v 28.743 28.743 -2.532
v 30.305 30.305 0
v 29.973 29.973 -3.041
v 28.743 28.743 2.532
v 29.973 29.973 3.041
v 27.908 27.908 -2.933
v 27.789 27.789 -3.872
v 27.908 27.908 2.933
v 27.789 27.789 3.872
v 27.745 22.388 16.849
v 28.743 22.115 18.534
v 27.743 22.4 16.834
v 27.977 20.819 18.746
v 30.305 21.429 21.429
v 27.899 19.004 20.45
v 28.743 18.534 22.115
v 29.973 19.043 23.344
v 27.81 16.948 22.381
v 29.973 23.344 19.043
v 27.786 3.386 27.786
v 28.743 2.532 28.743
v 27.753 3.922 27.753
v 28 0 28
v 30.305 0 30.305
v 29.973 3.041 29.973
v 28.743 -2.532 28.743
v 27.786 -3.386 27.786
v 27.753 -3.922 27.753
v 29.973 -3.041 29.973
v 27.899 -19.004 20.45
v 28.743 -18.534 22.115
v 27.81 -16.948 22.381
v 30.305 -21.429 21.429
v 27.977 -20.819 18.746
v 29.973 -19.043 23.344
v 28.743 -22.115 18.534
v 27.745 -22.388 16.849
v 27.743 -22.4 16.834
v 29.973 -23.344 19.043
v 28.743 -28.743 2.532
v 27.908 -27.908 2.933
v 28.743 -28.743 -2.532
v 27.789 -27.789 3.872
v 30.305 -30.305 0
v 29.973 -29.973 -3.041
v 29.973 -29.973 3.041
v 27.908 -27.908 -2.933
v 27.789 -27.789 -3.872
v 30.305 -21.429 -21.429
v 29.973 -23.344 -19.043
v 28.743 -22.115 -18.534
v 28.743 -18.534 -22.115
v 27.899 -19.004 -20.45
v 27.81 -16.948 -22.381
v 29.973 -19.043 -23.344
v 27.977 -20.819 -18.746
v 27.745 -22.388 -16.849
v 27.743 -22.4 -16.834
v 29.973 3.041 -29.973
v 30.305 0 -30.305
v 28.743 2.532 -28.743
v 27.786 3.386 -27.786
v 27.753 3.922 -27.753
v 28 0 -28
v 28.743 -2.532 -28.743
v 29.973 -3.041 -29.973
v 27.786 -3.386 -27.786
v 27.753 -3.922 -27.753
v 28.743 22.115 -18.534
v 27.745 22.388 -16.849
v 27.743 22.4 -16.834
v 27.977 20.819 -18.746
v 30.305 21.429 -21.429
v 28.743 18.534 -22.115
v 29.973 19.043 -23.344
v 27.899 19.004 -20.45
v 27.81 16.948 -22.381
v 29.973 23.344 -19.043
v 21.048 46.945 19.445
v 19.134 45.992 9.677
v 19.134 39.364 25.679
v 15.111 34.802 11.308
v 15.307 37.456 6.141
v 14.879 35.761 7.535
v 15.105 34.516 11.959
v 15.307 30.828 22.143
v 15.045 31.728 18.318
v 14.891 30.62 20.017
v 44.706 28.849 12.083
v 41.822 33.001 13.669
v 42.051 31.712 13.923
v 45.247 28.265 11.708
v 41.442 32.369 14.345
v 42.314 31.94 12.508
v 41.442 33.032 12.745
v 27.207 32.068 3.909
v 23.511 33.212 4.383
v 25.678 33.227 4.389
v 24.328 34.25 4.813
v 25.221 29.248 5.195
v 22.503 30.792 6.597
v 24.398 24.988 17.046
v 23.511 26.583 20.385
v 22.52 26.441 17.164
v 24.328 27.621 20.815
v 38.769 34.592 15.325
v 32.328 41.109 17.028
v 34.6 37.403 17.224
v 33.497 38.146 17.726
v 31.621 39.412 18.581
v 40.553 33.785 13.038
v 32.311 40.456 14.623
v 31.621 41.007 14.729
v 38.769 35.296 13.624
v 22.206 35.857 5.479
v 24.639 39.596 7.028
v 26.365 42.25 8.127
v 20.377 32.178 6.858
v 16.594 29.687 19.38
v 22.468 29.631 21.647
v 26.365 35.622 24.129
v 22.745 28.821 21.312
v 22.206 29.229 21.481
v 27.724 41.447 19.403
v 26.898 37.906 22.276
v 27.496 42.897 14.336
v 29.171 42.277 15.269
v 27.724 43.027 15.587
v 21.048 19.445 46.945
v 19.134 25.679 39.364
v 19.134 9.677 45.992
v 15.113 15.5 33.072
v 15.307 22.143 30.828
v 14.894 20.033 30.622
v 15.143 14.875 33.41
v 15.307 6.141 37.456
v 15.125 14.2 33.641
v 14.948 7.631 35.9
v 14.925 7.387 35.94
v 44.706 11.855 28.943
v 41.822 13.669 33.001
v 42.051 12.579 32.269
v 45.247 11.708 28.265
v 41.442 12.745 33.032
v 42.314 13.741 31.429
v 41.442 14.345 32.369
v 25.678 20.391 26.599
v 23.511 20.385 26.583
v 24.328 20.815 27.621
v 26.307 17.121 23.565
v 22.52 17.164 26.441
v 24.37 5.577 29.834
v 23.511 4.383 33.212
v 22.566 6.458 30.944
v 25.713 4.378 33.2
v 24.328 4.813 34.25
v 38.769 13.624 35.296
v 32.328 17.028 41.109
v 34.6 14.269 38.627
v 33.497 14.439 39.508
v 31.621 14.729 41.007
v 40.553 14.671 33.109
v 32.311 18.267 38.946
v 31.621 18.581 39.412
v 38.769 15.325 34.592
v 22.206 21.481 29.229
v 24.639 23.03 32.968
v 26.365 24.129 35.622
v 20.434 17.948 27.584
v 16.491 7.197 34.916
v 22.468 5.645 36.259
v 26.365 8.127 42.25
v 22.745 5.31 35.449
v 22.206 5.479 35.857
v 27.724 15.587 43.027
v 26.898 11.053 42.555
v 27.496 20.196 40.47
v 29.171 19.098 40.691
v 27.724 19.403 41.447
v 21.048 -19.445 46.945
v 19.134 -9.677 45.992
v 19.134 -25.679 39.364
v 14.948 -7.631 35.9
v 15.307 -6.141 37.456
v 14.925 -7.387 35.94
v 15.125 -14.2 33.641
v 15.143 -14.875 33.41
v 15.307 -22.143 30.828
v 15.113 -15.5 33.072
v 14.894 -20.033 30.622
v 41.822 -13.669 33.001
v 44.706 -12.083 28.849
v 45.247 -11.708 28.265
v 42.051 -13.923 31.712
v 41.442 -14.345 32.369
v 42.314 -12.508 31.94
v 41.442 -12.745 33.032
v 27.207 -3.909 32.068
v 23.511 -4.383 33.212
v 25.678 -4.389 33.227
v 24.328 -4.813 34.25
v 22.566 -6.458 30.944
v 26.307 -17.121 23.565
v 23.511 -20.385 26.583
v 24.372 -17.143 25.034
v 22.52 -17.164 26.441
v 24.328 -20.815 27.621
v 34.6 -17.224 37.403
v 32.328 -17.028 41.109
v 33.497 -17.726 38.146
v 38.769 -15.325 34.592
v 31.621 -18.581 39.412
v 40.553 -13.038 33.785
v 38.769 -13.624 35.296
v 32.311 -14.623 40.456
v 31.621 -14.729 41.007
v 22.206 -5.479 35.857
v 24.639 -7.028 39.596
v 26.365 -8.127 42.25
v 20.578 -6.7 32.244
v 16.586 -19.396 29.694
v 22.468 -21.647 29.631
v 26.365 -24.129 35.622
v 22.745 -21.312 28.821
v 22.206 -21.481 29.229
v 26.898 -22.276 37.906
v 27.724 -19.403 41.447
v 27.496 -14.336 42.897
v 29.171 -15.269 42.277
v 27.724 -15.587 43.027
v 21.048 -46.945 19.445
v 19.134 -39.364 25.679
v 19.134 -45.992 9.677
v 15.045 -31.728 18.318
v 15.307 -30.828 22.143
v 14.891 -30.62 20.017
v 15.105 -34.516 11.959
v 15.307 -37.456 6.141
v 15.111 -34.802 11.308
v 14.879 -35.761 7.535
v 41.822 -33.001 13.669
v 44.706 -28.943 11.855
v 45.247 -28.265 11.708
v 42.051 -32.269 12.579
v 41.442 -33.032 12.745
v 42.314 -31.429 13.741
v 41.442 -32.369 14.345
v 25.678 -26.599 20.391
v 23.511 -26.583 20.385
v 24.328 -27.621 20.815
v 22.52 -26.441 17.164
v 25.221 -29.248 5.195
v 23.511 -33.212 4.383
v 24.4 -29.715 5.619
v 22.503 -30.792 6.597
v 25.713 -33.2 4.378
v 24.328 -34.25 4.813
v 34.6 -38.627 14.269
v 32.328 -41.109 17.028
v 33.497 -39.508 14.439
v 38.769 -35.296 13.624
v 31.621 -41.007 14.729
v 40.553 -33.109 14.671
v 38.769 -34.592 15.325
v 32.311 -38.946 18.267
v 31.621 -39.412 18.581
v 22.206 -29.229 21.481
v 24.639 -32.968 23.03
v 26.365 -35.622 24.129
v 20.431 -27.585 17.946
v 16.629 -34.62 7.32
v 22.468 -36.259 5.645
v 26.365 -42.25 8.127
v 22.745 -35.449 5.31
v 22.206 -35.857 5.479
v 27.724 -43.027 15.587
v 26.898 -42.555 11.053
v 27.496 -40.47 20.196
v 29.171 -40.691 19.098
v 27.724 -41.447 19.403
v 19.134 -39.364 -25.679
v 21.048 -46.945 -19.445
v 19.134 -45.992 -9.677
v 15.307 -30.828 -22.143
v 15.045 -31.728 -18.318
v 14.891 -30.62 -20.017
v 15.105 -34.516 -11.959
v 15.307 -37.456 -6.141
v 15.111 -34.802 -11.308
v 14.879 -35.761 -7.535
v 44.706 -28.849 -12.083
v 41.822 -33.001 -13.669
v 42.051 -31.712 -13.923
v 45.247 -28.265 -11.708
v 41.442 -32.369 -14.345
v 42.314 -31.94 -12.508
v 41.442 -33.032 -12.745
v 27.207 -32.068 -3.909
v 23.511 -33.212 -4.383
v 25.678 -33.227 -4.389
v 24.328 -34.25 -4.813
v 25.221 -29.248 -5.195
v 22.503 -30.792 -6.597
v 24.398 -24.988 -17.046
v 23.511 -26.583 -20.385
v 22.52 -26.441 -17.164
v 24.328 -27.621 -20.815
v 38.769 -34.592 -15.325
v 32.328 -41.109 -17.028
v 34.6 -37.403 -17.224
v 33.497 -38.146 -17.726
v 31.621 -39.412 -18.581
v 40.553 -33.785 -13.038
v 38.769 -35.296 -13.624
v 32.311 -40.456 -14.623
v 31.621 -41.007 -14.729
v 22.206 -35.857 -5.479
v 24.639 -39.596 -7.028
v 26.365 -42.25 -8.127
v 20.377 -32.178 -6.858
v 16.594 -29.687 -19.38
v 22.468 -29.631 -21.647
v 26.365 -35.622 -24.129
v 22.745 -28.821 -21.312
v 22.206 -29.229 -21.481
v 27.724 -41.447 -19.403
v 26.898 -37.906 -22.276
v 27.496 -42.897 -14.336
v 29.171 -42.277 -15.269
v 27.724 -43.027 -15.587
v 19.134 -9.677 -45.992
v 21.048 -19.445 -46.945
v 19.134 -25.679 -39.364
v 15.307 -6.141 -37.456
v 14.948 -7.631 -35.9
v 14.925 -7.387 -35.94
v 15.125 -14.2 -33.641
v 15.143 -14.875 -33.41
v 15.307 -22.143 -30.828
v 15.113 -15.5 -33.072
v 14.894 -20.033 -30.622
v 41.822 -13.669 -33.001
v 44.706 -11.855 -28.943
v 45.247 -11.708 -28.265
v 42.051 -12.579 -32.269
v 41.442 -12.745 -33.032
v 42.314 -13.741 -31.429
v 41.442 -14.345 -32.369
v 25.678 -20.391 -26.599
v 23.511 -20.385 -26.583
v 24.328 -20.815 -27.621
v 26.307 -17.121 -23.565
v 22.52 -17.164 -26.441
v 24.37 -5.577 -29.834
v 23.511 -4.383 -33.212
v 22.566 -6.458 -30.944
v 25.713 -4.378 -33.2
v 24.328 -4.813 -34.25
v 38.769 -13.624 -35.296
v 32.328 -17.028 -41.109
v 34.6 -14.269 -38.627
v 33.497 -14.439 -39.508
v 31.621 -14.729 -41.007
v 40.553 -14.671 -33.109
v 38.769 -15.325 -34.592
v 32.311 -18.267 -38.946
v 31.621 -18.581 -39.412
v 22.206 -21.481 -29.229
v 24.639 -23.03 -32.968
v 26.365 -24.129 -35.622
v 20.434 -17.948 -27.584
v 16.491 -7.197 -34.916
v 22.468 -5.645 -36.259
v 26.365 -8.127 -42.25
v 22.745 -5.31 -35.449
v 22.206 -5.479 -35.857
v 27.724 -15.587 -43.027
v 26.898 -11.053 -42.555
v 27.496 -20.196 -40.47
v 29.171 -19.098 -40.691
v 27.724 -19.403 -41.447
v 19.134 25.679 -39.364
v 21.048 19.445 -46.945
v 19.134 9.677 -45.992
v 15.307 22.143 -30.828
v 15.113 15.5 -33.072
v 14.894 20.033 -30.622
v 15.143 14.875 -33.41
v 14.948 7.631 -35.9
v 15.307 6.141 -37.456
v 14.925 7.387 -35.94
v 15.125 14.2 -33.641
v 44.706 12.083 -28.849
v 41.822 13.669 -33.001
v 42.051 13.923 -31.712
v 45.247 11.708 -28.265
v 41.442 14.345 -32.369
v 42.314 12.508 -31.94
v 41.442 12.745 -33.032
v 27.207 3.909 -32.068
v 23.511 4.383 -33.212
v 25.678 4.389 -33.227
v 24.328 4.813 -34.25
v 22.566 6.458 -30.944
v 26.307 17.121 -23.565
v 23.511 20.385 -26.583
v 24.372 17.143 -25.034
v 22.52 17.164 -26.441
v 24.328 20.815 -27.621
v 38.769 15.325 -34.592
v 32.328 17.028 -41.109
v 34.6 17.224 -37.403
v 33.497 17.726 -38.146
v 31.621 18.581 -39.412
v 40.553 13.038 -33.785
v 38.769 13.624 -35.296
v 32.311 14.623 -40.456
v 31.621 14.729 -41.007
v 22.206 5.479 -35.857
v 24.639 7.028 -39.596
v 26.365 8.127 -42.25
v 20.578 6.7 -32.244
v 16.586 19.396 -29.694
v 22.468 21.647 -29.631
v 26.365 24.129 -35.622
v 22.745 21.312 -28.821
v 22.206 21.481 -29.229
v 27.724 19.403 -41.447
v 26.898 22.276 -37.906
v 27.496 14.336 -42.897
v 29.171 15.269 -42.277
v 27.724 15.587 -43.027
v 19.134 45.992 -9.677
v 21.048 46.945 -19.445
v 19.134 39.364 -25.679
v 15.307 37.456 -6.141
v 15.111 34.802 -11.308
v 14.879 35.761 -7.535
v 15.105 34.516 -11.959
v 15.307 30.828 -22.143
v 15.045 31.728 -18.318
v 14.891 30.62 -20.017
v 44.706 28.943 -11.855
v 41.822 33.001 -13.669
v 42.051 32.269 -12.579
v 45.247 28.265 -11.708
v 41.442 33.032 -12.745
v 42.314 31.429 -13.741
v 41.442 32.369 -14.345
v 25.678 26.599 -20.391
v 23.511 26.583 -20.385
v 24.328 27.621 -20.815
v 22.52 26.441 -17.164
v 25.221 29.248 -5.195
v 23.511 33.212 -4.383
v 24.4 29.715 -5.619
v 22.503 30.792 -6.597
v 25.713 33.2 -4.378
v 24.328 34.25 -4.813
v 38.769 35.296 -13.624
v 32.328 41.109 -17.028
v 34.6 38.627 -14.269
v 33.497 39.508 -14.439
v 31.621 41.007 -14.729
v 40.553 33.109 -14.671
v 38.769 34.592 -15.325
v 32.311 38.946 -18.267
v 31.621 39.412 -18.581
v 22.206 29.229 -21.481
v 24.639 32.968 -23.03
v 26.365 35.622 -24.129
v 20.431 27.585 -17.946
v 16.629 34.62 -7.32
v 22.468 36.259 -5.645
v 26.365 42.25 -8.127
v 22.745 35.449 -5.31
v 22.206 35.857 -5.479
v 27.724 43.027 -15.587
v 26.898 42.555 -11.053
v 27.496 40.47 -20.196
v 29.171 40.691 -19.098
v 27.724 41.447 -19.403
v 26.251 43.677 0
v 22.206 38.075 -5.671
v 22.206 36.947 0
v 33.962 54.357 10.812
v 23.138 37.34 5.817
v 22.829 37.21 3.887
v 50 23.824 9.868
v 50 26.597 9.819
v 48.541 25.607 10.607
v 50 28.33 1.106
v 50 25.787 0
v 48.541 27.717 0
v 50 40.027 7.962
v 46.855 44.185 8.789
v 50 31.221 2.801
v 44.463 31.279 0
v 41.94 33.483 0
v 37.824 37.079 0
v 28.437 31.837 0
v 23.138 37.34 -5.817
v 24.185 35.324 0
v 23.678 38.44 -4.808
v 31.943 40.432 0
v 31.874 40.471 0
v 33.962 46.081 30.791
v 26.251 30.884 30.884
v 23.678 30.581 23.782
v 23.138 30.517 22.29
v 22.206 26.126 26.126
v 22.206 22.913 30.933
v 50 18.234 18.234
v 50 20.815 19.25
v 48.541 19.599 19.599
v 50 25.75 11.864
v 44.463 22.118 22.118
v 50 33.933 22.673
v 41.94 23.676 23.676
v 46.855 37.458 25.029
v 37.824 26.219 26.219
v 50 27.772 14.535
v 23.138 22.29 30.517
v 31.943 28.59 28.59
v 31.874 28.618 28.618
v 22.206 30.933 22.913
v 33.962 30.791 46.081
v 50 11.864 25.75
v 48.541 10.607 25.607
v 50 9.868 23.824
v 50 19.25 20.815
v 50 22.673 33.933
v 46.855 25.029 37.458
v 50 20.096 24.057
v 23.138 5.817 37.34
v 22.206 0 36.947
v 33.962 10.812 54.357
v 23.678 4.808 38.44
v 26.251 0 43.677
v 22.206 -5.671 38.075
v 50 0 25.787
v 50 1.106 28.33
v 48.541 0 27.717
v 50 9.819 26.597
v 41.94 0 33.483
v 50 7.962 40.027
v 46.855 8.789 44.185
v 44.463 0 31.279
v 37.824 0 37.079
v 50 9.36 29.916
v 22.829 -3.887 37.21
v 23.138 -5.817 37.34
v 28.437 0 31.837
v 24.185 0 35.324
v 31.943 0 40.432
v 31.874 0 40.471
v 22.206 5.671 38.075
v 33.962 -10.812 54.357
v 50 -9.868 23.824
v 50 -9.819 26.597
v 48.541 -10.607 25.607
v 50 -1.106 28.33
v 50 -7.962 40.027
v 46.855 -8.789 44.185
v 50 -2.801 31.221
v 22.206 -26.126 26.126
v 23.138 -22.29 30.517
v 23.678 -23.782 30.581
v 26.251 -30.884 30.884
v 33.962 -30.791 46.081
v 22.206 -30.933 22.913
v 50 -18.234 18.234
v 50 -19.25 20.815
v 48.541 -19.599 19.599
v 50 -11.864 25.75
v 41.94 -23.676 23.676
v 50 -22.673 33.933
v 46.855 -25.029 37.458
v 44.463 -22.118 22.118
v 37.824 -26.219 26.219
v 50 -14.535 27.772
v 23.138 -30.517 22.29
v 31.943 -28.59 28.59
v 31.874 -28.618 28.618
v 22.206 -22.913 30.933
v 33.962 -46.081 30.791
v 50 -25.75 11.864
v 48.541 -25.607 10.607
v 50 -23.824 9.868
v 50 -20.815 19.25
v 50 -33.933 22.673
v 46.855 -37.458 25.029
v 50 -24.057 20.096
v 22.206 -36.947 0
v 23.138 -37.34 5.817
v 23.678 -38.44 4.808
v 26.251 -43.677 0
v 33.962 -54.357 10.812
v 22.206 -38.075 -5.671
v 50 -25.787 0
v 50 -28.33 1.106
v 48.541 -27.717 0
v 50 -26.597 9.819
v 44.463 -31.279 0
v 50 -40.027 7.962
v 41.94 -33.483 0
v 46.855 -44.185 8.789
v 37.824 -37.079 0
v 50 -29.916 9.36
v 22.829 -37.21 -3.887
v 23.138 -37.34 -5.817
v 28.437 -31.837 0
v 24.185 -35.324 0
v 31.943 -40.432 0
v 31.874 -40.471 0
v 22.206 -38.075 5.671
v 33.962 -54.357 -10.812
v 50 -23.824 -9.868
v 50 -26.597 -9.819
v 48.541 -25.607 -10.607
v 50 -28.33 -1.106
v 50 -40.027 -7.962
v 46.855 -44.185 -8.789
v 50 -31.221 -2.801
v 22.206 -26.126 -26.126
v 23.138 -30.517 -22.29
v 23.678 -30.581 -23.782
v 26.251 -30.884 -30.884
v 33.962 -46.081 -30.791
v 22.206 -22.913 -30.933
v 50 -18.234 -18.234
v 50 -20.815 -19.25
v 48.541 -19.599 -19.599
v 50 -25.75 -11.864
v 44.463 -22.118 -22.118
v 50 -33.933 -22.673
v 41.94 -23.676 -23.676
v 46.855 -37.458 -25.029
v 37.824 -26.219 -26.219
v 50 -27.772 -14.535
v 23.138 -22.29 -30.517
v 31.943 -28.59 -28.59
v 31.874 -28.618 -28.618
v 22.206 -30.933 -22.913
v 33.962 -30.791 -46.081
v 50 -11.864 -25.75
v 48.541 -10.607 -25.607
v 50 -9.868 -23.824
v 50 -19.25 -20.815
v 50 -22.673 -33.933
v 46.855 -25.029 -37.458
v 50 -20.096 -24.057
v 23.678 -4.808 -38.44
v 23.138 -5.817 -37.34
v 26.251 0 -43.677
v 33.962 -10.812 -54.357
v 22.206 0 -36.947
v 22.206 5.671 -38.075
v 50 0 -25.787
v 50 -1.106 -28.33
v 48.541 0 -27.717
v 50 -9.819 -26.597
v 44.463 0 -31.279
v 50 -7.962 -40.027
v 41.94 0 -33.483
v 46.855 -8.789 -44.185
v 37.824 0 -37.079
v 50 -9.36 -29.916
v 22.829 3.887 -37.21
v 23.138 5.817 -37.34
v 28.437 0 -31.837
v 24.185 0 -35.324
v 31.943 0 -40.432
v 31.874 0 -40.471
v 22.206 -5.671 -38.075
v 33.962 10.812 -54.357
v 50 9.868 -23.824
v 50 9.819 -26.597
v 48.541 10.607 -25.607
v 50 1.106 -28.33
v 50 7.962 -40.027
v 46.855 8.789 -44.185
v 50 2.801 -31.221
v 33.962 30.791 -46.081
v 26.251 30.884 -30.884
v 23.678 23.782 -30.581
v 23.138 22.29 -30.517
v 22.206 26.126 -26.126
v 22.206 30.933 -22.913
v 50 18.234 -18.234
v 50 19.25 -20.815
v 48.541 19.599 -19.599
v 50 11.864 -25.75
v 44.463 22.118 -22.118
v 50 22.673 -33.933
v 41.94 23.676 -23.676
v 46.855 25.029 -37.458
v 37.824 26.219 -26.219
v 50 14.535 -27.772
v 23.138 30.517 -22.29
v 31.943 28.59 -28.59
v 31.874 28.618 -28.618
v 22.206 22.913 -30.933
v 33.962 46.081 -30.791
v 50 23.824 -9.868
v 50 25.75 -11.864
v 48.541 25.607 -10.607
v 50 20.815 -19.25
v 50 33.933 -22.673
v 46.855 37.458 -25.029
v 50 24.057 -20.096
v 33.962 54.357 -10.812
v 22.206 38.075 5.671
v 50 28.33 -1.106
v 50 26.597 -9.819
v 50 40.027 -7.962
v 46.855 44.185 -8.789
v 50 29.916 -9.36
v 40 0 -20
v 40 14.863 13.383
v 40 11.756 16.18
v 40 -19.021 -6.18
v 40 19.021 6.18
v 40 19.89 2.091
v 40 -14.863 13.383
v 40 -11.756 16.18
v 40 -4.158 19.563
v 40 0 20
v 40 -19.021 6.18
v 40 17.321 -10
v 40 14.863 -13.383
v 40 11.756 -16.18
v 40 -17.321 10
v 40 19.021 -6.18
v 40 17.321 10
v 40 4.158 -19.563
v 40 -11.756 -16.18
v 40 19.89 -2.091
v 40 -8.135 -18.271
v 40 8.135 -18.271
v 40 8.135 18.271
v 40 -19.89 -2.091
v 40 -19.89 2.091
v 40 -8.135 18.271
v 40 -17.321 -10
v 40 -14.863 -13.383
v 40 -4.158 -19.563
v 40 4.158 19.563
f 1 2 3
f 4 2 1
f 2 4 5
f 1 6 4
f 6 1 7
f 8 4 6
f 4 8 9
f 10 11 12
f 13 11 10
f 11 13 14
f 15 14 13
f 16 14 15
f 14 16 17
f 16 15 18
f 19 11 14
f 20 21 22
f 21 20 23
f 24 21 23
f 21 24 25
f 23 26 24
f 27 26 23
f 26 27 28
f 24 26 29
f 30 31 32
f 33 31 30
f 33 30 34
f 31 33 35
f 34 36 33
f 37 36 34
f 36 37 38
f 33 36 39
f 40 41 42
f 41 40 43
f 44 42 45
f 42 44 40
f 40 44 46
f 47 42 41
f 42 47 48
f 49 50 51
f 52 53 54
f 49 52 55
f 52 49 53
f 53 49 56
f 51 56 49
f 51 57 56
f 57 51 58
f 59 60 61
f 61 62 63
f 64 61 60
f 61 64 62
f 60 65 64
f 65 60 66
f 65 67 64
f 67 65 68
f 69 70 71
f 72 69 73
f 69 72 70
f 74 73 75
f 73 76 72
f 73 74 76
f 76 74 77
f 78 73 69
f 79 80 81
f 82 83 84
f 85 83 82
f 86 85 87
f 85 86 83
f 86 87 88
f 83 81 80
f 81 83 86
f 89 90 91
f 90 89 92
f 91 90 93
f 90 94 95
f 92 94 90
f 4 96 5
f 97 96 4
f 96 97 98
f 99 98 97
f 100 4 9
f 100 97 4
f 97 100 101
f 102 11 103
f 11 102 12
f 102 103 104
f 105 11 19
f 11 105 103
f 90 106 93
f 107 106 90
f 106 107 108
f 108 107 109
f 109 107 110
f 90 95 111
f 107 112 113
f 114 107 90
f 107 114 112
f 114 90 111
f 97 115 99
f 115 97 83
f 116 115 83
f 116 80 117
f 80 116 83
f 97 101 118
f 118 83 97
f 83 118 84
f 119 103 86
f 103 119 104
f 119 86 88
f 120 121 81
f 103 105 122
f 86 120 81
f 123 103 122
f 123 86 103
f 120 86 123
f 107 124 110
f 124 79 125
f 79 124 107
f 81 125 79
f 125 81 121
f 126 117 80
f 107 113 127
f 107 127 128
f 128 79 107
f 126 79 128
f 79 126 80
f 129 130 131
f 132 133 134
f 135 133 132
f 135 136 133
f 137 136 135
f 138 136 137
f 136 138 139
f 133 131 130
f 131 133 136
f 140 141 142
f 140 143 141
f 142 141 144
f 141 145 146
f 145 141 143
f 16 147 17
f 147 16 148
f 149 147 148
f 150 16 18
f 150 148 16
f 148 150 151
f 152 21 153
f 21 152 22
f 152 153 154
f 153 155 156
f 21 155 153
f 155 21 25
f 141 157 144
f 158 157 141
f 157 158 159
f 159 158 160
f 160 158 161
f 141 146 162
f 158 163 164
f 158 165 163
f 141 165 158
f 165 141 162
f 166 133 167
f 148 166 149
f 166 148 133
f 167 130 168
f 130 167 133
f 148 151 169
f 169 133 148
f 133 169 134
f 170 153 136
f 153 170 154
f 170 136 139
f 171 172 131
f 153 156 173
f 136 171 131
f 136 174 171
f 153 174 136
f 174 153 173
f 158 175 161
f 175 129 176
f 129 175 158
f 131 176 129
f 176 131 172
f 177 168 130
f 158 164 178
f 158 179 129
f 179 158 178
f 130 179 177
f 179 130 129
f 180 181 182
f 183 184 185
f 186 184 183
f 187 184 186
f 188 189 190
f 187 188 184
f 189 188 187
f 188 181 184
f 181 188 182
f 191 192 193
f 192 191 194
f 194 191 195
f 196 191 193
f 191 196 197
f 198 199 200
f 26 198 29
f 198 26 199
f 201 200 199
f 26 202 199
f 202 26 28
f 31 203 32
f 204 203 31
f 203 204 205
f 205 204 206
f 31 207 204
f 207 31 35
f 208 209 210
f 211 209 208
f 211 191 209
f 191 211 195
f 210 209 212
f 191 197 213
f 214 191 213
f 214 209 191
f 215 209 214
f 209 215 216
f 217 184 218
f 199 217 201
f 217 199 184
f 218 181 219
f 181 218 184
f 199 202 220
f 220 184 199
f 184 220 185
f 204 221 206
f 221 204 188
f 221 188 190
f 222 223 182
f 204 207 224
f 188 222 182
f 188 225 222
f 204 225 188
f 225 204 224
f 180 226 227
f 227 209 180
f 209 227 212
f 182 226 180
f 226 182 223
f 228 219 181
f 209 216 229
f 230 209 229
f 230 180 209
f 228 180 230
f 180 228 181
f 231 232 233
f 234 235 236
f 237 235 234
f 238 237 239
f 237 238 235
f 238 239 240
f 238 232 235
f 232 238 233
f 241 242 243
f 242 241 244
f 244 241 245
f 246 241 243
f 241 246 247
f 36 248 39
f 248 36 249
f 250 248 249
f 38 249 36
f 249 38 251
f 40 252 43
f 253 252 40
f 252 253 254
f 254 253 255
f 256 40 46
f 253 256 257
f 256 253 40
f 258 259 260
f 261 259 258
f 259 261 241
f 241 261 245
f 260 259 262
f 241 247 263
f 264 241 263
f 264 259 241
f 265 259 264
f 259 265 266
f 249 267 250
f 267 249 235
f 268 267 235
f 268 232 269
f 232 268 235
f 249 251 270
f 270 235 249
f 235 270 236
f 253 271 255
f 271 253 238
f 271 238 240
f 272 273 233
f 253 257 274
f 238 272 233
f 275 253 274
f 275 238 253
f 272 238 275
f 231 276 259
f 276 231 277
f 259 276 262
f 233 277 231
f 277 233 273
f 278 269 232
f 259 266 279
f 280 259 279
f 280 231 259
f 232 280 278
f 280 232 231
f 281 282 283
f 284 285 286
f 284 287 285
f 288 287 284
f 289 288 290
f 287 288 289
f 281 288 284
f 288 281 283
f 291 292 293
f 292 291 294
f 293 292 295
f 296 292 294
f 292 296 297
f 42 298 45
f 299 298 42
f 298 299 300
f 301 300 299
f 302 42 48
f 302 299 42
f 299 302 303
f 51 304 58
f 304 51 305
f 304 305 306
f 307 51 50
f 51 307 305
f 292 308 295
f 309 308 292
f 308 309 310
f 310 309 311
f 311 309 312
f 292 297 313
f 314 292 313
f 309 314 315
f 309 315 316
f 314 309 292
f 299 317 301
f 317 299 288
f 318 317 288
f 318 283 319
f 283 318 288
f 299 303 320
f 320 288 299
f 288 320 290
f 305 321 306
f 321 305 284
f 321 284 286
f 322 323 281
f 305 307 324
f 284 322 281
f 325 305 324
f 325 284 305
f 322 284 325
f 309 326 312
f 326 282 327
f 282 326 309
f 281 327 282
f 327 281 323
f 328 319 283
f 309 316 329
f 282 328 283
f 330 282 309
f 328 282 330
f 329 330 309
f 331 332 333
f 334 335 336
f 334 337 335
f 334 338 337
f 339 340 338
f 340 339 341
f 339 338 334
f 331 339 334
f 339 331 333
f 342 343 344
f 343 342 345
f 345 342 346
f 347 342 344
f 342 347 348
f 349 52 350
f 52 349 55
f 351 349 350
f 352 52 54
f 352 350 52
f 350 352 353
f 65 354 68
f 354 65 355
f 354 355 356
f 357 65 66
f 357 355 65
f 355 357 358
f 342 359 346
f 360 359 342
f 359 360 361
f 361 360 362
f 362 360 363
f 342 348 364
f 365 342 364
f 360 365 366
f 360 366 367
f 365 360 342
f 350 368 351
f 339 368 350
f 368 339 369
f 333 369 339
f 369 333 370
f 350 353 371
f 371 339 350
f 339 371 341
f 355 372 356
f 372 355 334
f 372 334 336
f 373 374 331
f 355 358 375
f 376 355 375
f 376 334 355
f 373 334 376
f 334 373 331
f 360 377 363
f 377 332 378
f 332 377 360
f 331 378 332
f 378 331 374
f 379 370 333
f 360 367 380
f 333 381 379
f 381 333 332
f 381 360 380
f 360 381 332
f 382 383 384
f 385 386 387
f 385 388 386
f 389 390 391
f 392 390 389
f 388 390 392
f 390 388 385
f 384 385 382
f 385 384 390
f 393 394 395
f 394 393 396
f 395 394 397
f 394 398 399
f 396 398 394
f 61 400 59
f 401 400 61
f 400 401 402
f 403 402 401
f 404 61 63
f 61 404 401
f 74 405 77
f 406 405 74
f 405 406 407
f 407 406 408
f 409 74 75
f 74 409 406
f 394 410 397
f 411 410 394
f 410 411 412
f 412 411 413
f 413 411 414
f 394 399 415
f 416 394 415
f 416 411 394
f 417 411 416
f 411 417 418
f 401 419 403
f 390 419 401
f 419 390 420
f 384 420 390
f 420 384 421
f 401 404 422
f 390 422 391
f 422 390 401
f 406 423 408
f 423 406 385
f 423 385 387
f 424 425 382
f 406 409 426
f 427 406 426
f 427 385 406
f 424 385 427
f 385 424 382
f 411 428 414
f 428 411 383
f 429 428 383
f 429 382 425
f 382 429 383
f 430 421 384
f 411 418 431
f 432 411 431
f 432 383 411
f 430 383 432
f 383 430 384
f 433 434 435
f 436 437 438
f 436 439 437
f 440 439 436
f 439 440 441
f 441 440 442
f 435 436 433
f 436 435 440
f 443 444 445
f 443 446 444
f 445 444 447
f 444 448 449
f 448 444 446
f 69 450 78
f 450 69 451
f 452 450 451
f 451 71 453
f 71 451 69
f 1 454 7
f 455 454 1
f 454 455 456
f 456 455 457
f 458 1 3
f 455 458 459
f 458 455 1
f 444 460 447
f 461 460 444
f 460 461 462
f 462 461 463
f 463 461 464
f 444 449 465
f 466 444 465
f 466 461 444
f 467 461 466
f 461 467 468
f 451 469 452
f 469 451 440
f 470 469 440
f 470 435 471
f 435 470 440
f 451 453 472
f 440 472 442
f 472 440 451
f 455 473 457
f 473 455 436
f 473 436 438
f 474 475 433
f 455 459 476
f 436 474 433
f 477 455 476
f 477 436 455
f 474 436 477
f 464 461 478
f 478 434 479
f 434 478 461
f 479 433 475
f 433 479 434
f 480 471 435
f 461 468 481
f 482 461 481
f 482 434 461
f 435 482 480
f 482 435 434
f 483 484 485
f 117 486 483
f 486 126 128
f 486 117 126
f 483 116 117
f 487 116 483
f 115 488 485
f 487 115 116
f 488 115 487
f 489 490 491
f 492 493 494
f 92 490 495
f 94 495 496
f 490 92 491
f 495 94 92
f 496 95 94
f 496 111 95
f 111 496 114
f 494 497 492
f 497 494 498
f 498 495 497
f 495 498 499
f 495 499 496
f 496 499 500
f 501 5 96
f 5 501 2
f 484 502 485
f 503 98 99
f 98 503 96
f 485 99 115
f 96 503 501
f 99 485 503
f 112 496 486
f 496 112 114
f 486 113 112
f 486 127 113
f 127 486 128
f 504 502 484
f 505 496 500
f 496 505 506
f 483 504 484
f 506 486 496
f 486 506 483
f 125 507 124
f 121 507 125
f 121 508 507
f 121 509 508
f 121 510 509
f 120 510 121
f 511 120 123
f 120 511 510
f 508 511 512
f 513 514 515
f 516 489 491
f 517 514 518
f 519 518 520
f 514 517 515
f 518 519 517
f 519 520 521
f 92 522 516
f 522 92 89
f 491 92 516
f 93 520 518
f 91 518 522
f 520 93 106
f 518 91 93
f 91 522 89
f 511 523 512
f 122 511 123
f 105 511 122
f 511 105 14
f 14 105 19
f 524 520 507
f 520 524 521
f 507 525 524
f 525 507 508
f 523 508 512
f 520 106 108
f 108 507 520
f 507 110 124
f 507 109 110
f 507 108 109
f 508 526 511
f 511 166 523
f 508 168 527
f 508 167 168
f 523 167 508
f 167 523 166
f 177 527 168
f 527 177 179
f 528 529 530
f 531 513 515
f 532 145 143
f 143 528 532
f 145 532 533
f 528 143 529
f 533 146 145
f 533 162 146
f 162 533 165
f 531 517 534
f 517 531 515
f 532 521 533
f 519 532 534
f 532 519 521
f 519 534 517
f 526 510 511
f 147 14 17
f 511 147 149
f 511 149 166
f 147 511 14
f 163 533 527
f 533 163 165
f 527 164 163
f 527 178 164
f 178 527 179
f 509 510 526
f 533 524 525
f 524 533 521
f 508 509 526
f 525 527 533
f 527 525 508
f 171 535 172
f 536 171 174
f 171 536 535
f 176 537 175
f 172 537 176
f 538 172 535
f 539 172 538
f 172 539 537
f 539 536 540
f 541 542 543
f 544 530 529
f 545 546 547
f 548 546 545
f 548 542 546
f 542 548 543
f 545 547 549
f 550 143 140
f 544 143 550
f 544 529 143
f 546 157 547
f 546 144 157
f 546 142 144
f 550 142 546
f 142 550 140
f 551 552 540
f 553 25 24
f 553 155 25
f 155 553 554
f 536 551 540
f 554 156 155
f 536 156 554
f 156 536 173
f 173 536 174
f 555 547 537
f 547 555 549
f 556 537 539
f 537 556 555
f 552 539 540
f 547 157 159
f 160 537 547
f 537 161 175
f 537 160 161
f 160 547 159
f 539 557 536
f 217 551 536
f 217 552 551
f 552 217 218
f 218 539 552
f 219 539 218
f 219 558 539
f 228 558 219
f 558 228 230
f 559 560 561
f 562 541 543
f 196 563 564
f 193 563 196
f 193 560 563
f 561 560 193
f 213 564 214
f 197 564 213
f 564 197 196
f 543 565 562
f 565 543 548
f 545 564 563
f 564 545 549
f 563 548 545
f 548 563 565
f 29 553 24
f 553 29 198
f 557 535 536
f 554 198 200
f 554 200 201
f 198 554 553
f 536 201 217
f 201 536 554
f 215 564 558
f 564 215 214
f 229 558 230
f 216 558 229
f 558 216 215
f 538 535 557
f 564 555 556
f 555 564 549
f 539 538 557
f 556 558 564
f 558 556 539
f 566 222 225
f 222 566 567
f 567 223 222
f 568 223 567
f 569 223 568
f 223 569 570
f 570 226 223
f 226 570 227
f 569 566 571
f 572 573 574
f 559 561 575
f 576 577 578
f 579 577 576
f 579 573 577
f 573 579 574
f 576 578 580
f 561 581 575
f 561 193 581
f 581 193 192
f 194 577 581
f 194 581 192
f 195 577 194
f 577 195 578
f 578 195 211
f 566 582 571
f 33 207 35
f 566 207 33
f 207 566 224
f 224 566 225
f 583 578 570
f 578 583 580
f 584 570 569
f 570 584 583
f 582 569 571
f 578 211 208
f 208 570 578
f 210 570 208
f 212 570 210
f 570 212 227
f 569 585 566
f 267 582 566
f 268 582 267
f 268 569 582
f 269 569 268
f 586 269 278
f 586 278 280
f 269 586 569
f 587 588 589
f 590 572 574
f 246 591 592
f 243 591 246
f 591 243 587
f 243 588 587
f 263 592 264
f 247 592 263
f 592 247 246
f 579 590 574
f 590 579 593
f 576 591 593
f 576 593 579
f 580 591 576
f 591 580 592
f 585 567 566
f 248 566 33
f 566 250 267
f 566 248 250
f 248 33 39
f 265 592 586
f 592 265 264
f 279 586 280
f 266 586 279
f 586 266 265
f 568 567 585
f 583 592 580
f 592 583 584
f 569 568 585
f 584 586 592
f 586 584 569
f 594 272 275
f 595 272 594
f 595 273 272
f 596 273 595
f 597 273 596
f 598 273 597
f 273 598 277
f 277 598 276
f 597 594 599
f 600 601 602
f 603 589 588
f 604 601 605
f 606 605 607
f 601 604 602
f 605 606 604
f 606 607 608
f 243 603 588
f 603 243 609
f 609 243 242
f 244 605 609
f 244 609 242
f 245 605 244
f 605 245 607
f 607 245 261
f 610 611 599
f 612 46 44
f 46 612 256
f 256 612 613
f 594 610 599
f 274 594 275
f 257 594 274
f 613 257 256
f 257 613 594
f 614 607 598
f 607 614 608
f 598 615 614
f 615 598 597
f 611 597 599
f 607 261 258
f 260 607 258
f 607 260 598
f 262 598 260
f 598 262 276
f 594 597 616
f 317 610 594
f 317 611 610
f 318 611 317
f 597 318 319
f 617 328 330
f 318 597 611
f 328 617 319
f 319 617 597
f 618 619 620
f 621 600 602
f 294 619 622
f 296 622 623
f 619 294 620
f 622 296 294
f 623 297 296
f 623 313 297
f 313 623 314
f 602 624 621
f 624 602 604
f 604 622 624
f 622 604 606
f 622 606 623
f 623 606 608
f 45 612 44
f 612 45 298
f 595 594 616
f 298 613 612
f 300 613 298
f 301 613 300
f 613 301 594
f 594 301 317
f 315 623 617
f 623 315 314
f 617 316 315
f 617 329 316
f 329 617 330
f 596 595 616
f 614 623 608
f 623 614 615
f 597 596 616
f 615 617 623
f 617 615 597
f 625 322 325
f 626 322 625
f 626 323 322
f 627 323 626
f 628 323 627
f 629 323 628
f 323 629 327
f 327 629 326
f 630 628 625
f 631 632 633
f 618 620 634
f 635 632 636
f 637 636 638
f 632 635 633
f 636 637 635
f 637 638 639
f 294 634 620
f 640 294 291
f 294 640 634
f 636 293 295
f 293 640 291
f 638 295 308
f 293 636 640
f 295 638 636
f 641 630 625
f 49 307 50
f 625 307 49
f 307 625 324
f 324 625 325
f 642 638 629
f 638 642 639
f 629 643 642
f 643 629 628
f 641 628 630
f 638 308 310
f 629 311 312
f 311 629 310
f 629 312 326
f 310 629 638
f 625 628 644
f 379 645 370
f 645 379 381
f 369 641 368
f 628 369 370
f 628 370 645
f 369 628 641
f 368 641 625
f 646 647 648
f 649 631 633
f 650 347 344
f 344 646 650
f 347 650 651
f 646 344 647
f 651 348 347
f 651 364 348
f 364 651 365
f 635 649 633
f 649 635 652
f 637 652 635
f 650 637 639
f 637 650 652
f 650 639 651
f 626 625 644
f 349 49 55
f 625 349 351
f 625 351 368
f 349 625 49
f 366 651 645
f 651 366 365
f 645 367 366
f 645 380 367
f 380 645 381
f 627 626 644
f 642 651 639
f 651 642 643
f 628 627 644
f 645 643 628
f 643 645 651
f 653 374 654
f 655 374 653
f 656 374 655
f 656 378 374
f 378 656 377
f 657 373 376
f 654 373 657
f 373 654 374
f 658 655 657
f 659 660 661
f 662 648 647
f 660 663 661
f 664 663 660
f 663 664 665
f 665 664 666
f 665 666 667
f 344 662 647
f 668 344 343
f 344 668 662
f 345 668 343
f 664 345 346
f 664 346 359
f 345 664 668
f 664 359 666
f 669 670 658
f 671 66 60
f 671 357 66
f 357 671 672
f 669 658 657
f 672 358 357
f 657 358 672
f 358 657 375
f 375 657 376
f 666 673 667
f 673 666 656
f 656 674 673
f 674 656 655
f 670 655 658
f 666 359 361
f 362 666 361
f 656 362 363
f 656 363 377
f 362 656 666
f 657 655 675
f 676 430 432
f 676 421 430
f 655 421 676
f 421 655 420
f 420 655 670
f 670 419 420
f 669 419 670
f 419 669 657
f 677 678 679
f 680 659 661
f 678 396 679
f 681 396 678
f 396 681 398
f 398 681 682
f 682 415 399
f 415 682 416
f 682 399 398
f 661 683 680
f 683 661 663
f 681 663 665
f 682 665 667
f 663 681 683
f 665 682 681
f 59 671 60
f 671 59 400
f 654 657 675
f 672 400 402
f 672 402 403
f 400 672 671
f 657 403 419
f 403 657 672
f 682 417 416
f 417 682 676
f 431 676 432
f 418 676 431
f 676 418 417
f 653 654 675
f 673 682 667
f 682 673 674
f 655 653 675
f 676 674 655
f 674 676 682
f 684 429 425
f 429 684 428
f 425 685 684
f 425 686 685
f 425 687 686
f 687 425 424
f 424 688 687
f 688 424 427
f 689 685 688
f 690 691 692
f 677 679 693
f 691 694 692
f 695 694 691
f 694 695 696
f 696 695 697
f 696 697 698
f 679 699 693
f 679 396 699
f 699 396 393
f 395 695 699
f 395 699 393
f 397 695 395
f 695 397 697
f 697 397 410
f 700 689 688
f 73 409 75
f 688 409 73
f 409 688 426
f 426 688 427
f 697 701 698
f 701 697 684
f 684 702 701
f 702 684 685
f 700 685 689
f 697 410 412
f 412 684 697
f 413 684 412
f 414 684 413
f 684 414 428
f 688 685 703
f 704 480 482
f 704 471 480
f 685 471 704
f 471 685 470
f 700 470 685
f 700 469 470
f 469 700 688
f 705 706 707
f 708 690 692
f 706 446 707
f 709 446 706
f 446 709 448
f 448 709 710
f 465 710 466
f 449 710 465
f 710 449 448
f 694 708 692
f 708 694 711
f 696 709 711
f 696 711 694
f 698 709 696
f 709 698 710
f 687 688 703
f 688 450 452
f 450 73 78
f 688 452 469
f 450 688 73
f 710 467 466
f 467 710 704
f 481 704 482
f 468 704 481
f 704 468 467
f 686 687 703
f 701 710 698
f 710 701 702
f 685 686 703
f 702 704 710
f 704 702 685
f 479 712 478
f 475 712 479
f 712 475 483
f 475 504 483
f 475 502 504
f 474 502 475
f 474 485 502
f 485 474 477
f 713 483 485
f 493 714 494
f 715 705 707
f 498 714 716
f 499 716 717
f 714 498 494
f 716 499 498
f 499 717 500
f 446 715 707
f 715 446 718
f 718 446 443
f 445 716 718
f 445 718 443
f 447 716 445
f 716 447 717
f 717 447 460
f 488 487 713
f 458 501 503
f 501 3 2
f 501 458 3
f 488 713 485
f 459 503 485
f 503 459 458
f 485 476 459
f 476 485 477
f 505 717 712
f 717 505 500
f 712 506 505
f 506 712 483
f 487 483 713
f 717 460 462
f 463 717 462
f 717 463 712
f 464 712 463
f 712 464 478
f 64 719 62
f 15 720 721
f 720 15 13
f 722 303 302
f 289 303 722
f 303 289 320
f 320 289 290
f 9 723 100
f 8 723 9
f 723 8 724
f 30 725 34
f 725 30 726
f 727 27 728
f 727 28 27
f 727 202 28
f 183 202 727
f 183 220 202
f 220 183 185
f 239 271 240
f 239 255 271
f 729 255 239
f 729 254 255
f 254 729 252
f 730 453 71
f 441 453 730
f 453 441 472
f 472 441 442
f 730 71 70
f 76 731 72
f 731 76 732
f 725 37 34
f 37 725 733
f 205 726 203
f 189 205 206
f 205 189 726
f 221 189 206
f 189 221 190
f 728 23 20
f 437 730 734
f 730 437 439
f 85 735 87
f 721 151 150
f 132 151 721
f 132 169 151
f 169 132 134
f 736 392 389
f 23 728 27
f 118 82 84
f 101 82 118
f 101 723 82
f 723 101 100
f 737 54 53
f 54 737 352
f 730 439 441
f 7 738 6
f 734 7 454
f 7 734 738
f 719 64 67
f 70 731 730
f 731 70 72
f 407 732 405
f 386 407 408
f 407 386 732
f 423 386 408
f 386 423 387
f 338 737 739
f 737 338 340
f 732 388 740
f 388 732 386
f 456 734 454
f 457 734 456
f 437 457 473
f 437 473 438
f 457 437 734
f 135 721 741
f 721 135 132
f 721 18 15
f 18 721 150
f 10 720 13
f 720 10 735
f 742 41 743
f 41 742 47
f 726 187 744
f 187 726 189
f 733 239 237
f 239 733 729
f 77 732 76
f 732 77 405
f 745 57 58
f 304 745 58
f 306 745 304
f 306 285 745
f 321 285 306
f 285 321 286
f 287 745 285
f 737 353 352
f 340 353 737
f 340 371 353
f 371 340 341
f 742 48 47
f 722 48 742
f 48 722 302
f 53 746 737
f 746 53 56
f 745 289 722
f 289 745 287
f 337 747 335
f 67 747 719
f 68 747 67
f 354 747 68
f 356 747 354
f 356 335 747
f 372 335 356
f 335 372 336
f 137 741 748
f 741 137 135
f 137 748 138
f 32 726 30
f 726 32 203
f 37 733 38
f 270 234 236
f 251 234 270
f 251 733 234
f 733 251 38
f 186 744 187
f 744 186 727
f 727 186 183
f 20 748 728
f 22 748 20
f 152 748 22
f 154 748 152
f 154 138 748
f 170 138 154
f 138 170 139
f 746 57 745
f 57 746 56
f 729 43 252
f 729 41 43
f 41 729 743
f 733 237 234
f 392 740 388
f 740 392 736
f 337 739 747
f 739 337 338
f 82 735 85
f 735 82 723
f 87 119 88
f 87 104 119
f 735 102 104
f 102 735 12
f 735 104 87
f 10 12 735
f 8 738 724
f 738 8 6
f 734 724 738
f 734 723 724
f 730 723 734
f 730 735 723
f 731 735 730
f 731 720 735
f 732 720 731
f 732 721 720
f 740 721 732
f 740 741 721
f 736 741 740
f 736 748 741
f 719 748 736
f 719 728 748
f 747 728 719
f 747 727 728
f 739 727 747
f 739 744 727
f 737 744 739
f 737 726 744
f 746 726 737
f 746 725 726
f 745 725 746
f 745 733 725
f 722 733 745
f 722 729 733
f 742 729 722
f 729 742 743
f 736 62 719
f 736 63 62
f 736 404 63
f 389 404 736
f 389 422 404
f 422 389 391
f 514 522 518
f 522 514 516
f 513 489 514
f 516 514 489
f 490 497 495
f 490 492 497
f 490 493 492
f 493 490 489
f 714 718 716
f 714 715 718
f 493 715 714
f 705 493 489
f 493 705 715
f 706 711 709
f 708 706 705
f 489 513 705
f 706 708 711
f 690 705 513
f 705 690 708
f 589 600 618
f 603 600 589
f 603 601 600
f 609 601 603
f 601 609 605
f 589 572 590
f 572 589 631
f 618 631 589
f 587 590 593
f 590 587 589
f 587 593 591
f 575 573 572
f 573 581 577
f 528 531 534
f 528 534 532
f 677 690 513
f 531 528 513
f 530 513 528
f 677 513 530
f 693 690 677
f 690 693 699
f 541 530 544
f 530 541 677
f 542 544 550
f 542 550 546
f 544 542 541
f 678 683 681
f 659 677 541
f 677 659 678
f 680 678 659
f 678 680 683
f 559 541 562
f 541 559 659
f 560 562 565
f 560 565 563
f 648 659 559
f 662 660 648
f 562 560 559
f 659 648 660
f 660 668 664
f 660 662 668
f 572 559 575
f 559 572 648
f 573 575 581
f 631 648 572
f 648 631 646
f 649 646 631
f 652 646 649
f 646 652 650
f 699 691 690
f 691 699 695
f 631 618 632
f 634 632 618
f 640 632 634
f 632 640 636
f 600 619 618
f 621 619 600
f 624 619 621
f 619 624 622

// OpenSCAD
ANGLE_STEP = 45;

difference() {
    union() {
        for(angle = [0 : ANGLE_STEP : 720]) {
            rotate([angle, 0, 0])
                rotate_extrude(angle = ANGLE_STEP)
                    translate([40, 0, 0])
                        circle(10, $fn = 5);
        };

        for (angle = [ANGLE_STEP / 2 : ANGLE_STEP : 360 + ANGLE_STEP / 2]) {
            rotate([angle, 0, 0])
                rotate_extrude(angle = ANGLE_STEP * 1.5)
                    translate([45, 0, 0])
                        circle(10, $fn = 6);
        };
        
    for (angle = [ANGLE_STEP / 4 : ANGLE_STEP / 2 : 360 + ANGLE_STEP / 4]) {
            rotate([angle, 0, 0])
                rotate_extrude(angle = ANGLE_STEP * 1.3)
                    translate([50, 0, 0])
                        circle(15, $fn = 3);
        };
    };

    rotate([0, 90, 0])
        translate([0, 0, 10])
            cylinder(30, 40, 20);
    
    
    rotate([0, 90, 0])
        translate([0, 0, 50])
            cylinder(20, 60, 60);
}
